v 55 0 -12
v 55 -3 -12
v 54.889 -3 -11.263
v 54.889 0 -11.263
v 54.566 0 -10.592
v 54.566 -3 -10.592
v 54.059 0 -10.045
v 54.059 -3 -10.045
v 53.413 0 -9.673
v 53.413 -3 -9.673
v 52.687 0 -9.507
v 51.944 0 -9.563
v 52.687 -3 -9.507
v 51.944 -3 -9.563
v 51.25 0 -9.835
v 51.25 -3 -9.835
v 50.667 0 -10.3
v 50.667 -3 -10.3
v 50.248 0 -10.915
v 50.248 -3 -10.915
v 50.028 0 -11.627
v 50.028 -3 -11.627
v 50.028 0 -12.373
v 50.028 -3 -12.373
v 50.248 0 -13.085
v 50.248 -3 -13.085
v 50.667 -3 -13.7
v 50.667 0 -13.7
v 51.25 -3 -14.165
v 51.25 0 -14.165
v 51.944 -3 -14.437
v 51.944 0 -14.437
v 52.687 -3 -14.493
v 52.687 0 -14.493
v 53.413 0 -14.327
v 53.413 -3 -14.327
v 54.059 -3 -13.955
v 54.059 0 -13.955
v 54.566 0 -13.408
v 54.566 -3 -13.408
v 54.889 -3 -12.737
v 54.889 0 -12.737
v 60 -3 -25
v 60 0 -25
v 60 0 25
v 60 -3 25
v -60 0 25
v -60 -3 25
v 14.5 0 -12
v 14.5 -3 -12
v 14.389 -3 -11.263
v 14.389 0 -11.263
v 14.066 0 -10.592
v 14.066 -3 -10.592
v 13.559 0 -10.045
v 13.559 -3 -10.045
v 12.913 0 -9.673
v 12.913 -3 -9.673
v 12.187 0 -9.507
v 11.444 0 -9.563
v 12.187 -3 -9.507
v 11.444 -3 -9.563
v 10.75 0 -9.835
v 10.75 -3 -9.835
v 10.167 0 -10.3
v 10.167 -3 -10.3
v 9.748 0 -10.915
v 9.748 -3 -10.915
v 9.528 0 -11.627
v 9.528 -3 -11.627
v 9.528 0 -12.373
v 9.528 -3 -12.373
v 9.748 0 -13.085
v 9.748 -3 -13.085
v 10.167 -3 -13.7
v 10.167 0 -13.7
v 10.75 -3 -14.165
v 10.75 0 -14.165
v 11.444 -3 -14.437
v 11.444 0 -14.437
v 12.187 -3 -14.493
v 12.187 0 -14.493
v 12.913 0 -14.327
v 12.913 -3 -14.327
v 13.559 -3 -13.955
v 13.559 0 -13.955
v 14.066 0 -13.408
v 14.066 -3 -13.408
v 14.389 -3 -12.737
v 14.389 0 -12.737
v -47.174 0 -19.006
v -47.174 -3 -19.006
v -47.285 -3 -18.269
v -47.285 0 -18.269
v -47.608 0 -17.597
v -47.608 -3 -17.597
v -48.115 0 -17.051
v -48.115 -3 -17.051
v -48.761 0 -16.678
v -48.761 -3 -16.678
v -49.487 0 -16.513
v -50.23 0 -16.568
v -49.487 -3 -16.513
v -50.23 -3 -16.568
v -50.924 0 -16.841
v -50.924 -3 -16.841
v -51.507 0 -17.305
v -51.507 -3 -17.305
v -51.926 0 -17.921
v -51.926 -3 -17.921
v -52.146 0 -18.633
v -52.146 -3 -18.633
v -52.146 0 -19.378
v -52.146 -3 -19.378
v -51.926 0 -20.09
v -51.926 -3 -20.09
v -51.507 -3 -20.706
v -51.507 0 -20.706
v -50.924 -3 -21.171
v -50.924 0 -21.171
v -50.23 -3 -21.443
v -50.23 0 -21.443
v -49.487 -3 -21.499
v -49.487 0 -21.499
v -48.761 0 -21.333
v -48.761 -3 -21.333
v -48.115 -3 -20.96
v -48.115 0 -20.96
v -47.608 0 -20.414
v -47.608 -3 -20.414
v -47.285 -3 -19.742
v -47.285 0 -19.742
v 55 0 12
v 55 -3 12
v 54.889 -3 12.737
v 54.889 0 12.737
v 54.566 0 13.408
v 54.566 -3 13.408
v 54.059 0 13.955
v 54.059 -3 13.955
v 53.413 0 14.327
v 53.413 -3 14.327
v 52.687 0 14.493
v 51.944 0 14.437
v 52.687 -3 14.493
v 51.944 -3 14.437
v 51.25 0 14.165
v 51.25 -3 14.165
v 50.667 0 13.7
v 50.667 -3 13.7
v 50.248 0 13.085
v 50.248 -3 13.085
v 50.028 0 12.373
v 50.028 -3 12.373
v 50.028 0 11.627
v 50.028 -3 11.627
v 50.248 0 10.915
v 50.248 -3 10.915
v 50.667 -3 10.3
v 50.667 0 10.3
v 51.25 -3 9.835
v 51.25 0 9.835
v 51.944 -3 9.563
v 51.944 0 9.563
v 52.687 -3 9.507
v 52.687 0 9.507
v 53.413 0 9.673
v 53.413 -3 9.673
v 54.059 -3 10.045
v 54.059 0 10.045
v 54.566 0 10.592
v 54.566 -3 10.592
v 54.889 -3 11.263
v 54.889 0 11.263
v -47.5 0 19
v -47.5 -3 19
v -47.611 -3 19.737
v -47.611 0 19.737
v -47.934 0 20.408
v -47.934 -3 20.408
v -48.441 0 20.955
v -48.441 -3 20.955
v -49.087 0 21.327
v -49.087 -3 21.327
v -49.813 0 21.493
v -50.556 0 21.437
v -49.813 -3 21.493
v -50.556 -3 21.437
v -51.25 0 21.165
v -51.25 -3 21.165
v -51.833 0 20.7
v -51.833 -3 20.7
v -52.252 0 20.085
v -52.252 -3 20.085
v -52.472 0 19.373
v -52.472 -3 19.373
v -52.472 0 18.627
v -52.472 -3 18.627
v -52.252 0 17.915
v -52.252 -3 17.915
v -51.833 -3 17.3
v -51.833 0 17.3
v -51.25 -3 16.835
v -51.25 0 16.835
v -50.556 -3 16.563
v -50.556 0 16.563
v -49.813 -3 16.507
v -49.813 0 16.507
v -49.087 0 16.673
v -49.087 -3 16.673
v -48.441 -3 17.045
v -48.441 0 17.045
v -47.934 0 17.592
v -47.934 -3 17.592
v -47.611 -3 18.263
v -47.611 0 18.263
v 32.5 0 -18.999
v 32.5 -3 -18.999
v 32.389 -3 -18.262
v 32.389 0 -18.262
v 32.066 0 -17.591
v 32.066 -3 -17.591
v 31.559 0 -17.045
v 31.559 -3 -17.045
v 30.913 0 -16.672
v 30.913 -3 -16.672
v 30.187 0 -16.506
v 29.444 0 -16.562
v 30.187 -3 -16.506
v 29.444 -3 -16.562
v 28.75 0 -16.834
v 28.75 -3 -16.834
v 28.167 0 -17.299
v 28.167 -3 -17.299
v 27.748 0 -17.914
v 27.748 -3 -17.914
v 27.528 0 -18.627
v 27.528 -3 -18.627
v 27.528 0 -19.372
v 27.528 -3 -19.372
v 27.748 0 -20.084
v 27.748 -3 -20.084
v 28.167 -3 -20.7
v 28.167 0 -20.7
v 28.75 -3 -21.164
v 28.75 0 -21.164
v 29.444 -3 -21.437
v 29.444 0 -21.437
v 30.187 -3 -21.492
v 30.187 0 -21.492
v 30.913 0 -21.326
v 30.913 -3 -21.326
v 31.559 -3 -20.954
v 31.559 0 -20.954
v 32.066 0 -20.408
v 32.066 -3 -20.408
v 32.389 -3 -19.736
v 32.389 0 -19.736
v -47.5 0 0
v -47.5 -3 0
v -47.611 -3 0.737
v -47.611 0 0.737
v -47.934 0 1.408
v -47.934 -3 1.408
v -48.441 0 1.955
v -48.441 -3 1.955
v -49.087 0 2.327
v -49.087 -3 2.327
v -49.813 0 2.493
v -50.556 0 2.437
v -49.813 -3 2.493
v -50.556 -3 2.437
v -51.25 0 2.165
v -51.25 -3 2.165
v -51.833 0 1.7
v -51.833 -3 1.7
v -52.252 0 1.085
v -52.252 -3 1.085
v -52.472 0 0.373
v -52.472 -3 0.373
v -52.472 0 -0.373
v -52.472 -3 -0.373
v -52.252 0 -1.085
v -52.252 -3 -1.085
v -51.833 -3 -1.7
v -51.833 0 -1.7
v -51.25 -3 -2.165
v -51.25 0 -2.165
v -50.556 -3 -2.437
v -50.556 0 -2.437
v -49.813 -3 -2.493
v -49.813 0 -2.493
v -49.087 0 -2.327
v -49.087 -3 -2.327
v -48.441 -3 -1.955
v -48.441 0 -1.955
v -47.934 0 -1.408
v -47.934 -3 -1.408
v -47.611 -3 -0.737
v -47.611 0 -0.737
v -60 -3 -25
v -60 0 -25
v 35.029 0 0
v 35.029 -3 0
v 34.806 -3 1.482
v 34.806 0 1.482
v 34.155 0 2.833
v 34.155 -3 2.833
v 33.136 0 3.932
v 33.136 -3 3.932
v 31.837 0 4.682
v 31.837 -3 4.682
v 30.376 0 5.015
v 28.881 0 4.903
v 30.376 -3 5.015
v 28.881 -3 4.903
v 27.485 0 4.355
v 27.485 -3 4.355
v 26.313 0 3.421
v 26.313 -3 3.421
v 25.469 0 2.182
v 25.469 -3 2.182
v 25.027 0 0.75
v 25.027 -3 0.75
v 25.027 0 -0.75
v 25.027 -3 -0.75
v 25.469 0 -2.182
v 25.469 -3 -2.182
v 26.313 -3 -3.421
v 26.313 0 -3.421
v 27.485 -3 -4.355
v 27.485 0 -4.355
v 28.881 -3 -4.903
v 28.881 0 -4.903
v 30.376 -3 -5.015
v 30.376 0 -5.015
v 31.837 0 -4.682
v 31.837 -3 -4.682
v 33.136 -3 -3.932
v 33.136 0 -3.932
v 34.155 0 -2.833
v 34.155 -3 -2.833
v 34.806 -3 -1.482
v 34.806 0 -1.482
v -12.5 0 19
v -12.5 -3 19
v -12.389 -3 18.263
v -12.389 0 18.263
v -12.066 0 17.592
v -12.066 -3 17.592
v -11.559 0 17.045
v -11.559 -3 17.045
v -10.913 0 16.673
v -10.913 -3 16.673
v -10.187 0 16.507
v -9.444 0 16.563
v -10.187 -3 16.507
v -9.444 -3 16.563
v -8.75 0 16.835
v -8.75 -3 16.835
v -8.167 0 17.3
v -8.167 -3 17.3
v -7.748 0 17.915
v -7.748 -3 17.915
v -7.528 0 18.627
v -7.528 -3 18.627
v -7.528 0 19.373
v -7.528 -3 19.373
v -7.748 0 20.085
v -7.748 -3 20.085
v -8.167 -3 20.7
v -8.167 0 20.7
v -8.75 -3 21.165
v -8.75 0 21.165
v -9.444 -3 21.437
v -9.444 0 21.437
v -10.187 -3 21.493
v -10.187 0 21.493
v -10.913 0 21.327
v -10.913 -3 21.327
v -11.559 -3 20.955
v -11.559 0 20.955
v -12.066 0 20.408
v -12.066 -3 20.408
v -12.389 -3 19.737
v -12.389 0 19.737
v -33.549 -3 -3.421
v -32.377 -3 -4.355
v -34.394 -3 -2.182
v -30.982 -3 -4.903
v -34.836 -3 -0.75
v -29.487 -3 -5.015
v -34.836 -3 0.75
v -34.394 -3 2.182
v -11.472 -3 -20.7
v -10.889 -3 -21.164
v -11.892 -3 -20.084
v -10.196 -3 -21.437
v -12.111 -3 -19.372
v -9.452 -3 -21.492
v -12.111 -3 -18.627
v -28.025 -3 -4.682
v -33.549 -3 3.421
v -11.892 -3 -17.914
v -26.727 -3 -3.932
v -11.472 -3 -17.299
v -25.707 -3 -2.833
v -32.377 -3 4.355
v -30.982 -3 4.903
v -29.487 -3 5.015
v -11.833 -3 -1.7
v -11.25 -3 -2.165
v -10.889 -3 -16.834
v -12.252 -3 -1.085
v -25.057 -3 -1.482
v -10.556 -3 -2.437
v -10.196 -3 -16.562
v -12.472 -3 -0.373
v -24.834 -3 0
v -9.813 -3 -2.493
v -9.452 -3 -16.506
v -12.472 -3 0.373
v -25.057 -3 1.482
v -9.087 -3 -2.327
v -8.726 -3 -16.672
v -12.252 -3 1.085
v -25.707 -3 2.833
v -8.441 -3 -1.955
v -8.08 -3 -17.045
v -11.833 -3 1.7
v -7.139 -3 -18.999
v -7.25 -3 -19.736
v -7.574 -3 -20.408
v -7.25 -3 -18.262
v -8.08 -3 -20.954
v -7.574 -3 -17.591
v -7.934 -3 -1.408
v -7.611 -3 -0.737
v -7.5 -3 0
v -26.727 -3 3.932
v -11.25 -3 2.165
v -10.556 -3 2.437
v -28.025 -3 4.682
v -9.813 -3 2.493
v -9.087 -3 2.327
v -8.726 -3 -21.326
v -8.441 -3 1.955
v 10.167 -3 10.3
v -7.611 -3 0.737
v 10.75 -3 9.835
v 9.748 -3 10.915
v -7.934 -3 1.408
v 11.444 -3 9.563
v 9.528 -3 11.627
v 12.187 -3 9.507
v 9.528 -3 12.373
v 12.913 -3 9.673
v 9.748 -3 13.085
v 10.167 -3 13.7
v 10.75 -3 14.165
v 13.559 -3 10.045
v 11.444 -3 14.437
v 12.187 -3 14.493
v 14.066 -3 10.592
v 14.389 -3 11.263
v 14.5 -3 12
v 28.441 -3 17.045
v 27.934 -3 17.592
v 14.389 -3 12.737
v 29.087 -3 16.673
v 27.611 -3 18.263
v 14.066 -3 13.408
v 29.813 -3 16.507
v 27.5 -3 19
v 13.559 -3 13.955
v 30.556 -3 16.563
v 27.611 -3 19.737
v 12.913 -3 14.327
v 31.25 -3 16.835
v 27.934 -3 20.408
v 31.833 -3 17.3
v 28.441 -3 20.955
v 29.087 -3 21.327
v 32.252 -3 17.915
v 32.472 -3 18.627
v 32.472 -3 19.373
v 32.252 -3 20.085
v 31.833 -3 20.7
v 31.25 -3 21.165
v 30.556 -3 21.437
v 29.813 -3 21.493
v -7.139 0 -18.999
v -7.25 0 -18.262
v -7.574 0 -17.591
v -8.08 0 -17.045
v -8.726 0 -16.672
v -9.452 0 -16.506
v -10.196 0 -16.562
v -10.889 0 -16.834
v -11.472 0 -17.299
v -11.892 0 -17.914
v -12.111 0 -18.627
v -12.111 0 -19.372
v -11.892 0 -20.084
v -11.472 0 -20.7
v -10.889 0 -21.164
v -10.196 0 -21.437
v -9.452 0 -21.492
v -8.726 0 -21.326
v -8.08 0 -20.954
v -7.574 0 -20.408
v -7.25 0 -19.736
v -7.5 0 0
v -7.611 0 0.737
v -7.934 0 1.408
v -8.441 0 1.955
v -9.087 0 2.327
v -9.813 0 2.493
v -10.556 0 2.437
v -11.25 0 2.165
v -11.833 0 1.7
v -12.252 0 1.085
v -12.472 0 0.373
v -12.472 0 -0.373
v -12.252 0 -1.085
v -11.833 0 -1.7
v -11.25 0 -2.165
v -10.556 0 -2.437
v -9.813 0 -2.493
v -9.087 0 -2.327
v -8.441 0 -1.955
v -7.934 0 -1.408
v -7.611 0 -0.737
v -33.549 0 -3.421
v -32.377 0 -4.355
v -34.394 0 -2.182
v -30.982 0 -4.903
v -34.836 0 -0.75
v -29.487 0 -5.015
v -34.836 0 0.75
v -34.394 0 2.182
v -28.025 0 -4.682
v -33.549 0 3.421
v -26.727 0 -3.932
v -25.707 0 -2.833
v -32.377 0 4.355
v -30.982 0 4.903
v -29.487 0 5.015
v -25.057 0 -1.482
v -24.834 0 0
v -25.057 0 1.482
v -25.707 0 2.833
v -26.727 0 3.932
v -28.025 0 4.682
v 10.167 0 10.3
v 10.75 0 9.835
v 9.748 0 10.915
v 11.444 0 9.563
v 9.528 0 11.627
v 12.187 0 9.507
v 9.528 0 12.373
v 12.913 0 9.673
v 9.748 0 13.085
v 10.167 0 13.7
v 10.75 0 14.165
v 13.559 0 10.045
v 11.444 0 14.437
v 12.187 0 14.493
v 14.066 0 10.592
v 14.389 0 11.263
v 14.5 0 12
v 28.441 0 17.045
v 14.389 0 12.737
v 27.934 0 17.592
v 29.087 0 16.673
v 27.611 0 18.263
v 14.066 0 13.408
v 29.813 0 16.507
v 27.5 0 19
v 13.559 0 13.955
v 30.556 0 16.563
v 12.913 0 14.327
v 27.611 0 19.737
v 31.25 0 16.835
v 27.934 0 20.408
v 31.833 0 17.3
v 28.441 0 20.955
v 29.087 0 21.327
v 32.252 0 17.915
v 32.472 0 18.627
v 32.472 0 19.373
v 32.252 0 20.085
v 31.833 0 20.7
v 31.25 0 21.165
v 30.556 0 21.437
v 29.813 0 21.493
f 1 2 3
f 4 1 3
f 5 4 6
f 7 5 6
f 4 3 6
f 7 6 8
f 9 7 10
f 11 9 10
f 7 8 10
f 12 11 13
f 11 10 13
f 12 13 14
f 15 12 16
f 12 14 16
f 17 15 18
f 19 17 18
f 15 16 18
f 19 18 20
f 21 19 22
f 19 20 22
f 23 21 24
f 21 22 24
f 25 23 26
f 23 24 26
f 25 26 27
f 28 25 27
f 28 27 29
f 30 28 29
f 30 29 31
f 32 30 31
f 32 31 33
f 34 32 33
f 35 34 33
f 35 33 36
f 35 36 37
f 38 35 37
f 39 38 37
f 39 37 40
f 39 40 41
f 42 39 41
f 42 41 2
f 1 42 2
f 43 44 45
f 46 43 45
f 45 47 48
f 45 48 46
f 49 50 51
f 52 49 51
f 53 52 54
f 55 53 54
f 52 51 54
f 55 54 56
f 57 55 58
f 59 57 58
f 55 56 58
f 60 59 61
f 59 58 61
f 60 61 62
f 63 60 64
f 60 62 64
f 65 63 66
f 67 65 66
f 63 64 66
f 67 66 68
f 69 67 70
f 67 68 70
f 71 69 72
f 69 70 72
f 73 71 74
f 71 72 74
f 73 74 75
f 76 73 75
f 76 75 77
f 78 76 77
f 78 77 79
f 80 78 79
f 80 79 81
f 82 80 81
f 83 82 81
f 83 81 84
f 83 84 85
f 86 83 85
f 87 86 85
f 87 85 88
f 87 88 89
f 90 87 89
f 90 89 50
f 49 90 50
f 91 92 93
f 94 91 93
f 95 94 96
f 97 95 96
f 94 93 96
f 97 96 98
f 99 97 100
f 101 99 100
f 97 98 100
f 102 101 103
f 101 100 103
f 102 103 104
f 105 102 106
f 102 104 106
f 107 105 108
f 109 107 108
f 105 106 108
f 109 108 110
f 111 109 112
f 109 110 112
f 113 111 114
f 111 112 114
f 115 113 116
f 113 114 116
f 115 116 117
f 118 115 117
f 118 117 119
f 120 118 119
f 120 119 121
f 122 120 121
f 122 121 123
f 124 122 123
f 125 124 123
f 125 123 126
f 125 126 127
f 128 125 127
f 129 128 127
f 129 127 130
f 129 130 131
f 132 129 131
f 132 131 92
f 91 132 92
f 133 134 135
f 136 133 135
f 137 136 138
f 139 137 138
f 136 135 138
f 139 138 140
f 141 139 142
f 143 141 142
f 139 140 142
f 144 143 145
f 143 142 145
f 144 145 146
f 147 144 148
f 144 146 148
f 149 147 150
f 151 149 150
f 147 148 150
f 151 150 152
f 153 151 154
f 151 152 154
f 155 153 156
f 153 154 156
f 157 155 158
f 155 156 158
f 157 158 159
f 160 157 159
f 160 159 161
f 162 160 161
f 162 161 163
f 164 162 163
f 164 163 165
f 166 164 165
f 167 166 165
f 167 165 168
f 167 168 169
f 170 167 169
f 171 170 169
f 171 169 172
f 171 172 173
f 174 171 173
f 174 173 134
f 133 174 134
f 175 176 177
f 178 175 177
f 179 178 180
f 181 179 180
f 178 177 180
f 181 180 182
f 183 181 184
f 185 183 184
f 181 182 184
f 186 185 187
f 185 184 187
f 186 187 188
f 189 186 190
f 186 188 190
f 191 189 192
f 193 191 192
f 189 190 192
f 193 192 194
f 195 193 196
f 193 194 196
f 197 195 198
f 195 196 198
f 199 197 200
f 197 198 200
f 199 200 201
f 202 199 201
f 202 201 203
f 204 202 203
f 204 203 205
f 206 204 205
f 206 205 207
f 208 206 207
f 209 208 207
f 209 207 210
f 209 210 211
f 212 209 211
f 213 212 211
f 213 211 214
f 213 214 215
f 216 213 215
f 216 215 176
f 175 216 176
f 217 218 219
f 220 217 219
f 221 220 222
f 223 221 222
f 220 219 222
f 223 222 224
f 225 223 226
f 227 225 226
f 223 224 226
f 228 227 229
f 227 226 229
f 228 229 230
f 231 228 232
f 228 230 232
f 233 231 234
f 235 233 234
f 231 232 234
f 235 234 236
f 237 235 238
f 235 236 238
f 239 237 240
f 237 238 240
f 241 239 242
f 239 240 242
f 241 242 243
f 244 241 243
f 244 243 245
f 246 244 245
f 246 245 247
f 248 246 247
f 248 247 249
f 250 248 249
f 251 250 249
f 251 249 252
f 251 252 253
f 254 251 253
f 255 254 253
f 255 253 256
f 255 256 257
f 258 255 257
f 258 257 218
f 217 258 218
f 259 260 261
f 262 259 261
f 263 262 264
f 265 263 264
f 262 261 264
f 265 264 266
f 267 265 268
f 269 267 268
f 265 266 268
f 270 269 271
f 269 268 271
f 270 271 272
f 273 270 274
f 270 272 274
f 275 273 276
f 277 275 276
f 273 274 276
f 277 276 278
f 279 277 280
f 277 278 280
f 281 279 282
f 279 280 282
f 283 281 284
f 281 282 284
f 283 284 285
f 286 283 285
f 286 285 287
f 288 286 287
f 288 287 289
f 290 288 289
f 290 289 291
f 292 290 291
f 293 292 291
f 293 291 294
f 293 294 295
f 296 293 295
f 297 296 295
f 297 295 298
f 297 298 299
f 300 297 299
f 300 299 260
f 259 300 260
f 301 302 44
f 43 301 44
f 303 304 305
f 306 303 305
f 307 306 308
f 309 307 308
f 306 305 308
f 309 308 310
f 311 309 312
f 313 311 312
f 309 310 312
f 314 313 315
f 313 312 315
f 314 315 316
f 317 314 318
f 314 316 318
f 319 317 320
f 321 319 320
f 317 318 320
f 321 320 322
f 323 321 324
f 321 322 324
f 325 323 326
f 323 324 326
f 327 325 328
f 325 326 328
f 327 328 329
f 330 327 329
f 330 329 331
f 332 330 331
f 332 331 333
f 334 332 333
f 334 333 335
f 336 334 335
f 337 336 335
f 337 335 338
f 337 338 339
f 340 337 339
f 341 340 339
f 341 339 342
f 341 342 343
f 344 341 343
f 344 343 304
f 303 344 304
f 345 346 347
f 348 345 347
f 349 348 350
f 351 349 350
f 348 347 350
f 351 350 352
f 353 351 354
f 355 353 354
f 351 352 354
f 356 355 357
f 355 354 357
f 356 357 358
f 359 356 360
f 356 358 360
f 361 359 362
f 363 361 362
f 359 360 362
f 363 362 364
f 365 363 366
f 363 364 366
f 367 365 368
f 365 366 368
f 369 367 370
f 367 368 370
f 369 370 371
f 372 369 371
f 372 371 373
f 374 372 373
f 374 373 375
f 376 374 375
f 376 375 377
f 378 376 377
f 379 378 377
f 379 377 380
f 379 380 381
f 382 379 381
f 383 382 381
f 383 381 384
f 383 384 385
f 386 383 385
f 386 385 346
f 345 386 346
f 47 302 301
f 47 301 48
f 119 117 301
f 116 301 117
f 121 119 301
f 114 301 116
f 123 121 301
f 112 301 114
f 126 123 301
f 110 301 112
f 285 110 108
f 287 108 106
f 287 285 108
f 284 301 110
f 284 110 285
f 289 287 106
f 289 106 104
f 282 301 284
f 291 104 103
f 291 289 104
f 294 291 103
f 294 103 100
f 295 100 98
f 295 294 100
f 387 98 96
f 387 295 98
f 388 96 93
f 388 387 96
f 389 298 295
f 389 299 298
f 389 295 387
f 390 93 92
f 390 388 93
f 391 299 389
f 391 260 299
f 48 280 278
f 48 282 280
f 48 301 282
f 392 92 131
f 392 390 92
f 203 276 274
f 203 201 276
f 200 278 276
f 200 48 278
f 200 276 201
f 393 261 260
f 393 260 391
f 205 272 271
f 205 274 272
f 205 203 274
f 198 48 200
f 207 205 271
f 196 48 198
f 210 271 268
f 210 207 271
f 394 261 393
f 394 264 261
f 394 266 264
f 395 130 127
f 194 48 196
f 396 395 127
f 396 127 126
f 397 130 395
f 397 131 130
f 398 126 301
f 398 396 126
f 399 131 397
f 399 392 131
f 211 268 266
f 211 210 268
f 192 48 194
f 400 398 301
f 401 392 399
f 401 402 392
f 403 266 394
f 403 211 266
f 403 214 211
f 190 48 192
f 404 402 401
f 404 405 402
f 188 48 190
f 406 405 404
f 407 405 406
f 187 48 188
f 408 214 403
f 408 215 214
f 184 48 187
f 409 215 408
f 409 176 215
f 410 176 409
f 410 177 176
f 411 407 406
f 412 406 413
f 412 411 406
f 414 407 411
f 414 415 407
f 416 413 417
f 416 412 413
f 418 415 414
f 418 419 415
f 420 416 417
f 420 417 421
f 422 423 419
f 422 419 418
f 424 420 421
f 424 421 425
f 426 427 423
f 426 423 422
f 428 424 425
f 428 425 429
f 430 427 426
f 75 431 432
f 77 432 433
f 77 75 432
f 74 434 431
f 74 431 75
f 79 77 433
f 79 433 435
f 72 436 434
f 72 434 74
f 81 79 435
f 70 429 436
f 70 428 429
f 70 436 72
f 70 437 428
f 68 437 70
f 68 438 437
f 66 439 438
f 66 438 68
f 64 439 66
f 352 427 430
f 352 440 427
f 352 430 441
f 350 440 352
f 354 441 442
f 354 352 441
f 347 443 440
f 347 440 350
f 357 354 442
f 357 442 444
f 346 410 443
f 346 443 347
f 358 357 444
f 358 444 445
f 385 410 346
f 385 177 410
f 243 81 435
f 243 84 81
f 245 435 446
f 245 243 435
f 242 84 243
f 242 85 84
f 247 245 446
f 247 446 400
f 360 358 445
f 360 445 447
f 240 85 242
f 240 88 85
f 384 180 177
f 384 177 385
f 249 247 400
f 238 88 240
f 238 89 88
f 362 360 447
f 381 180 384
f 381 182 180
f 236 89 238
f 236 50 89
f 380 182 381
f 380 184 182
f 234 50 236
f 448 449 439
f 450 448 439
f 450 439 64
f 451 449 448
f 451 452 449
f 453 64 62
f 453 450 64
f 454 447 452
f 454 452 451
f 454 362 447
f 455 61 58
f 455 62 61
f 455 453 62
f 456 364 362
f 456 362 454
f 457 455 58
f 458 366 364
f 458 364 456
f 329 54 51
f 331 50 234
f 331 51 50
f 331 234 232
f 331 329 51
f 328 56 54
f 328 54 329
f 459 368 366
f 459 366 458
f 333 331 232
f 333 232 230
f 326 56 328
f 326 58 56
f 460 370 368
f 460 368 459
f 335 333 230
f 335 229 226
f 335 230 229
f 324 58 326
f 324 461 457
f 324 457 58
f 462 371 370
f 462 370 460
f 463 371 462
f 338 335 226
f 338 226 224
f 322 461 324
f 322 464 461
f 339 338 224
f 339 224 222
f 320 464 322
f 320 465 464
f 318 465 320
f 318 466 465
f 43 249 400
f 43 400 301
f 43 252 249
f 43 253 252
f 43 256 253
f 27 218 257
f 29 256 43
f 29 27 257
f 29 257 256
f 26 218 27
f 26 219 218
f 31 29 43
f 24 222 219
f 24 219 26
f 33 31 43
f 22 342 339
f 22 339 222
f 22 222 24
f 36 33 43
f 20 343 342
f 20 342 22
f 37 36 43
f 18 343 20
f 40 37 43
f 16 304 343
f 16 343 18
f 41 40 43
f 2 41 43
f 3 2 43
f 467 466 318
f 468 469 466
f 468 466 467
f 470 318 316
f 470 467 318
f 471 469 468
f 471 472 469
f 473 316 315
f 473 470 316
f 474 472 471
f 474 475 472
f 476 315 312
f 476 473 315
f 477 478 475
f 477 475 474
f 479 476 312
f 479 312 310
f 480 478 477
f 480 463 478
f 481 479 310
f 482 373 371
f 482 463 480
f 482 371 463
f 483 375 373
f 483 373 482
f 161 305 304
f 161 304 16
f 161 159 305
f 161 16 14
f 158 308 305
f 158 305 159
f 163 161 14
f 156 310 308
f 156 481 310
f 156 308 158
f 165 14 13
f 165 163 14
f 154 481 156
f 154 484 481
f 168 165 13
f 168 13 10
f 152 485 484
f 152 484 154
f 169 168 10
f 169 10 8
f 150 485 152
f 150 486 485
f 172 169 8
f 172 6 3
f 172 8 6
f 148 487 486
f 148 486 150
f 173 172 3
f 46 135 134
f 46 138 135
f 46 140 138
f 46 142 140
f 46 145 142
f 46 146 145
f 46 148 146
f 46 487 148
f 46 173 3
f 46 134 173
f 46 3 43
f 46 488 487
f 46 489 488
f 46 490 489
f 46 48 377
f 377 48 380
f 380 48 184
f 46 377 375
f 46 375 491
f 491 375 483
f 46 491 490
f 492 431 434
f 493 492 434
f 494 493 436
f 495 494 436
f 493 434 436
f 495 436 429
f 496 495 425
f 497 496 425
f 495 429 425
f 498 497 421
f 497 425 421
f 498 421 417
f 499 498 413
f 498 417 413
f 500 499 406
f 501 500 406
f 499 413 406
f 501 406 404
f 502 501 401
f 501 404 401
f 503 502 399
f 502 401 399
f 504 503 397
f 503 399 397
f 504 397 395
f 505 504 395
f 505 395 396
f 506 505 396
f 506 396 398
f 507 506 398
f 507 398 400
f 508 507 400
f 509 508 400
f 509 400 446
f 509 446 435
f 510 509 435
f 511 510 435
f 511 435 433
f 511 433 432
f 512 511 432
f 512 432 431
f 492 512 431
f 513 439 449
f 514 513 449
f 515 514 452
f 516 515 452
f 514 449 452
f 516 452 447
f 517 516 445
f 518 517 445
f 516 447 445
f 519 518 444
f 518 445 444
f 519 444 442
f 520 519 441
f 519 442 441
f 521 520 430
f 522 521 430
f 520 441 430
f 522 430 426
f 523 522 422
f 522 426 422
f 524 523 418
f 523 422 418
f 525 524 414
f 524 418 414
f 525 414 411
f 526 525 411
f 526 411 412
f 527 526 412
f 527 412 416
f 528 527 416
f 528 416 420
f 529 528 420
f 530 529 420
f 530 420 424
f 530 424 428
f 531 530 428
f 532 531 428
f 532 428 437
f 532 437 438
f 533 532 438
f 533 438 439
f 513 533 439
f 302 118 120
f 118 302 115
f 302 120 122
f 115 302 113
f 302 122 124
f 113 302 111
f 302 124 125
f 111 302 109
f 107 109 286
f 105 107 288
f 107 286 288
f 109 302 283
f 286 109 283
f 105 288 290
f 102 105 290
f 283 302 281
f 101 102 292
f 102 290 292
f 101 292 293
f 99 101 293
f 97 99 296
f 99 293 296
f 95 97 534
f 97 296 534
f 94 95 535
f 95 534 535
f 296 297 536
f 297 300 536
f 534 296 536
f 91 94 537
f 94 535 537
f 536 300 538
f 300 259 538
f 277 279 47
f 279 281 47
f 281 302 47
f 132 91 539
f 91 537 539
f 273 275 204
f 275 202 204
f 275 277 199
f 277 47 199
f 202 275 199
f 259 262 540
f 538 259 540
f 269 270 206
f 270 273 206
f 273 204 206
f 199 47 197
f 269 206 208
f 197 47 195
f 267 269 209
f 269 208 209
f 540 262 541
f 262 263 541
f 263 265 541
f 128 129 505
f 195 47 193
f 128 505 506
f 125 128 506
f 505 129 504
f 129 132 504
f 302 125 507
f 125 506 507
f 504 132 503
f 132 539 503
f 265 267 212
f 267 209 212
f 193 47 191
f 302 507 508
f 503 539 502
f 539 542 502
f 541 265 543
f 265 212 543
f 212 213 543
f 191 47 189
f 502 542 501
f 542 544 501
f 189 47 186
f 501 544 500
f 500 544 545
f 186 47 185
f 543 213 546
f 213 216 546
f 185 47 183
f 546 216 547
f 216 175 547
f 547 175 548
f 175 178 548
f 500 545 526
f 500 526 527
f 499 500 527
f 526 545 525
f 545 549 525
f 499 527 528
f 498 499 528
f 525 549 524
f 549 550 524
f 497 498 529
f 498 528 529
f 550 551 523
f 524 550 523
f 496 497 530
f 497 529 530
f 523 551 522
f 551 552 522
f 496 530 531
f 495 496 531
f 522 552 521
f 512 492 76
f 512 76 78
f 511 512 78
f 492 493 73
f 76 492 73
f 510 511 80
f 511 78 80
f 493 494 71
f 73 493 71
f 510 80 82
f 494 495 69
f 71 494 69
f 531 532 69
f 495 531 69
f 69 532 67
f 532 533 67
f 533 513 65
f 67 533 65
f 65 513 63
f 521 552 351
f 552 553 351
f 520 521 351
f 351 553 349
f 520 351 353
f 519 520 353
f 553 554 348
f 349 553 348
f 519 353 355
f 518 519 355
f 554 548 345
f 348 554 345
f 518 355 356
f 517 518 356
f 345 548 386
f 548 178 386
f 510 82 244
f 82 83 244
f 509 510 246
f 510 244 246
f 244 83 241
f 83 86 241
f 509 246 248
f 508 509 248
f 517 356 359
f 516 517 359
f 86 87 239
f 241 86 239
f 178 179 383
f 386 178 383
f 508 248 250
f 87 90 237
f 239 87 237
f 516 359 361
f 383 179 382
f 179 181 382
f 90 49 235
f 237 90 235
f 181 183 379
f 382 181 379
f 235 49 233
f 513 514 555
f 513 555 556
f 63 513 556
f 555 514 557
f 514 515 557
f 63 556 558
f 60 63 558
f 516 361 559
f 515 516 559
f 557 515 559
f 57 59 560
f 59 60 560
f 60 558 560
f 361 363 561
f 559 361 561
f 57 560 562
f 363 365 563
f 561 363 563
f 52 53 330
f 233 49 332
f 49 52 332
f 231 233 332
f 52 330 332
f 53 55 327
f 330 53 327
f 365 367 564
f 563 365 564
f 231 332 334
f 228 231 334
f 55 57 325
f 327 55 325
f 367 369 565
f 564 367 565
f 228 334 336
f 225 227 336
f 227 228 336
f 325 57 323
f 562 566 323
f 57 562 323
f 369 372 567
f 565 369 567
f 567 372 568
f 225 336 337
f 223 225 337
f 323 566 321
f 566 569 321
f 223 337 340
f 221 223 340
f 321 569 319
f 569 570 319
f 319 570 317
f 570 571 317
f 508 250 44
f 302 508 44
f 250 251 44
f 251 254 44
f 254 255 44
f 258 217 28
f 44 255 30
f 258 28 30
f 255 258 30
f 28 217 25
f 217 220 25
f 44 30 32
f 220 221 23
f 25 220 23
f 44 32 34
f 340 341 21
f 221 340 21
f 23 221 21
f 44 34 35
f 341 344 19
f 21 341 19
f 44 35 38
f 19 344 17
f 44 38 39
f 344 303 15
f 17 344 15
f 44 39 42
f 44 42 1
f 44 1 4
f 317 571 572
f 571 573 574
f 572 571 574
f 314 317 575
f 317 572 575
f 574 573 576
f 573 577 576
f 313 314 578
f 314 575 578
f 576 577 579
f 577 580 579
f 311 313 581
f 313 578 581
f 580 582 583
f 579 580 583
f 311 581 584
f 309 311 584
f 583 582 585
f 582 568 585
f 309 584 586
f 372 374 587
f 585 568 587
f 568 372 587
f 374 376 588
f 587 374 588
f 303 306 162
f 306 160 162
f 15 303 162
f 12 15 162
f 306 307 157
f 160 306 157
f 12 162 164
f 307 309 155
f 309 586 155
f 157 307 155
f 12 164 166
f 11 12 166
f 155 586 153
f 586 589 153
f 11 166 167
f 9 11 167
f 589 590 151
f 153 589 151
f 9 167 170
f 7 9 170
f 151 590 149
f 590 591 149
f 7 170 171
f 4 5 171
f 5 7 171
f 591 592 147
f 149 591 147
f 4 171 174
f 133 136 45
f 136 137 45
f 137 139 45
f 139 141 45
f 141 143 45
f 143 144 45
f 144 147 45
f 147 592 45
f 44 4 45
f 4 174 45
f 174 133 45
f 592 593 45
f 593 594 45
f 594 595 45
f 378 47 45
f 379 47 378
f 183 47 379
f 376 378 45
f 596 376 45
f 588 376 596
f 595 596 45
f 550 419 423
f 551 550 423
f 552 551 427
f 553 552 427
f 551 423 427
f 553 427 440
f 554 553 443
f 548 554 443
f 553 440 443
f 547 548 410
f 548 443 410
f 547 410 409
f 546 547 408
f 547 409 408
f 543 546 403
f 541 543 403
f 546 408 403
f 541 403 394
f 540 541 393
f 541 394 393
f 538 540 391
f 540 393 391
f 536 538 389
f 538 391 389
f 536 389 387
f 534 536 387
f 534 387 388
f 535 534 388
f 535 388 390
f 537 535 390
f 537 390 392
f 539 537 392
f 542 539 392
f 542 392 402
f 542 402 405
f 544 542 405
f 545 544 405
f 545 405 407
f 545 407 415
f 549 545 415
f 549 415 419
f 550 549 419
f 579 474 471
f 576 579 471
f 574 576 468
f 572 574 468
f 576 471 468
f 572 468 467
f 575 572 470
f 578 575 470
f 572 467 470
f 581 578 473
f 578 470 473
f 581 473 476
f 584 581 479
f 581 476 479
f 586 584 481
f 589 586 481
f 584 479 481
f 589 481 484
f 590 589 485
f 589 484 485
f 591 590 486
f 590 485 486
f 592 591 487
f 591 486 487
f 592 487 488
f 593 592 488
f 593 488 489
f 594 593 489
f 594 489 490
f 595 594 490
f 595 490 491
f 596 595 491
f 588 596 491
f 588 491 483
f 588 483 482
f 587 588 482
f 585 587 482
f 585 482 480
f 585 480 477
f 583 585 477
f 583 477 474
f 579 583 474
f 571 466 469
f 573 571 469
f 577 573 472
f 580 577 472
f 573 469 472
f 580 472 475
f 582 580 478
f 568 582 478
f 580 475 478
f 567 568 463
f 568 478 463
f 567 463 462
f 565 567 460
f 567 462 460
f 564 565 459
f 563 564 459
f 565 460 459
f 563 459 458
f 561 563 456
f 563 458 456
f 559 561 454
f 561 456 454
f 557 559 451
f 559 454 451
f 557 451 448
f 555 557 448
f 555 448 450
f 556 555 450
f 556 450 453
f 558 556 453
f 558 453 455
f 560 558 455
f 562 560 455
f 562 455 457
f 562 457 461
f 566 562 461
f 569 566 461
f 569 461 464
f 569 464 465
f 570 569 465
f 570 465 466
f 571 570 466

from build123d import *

# Parameters (mm, degrees)
F0_W     = 120
F0_H     = 50
F1_DEPTH = 3
F2_R     = 2.5
F2_R_2   = 5.0292
F3_DEPTH = 3.001


with BuildPart() as f1:
    # F0 (on Front) → F1 (new body)
    with BuildSketch(Plane.XZ):
        Rectangle(F0_W, F0_H)
    extrude(amount=F1_DEPTH)

    # F2 (on face) → F3 (cut, through all)
    with BuildSketch(Plane.XZ.offset(3)):
        with Locations((-50, 0)):
            Circle(F2_R)
        with Locations((-49.6740713716, -19.0056)):
            Circle(F2_R)
        with Locations((-29.8628, 0)):
            Circle(F2_R_2)
        with Locations((-10, 0)):
            Circle(F2_R)
        with Locations((-9.6392054111, -18.9992)):
            Circle(F2_R)
        with Locations((12, 12)):
            Circle(F2_R)
        with Locations((12, -12)):
            Circle(F2_R)
        with Locations((30, 0)):
            Circle(F2_R_2)
        with Locations((30, -18.9992)):
            Circle(F2_R)
        with Locations((52.5, 12)):
            Circle(F2_R)
        with Locations((52.5, -12)):
            Circle(F2_R)
        with BuildLine():
            ThreePointArc((-7.5, 19), (-10, 21.5), (-12.5, 19))
            Line((-12.5, 19), (-7.5, 19))
        make_face()
        with BuildLine():
            Line((-7.5, 19), (-12.5, 19))
            ThreePointArc((-12.5, 19), (-10, 16.5), (-7.5, 19))
        make_face()
        with BuildLine():
            ThreePointArc((32.5, 19), (30, 21.5), (27.5, 19))
            Line((27.5, 19), (32.5, 19))
        make_face()
        with BuildLine():
            Line((32.5, 19), (27.5, 19))
            ThreePointArc((27.5, 19), (30, 16.5), (32.5, 19))
        make_face()
        with Locations((-50, 19)):
            Circle(F2_R)
    extrude(amount=-F3_DEPTH, mode=Mode.SUBTRACT)


solid = f1.part
